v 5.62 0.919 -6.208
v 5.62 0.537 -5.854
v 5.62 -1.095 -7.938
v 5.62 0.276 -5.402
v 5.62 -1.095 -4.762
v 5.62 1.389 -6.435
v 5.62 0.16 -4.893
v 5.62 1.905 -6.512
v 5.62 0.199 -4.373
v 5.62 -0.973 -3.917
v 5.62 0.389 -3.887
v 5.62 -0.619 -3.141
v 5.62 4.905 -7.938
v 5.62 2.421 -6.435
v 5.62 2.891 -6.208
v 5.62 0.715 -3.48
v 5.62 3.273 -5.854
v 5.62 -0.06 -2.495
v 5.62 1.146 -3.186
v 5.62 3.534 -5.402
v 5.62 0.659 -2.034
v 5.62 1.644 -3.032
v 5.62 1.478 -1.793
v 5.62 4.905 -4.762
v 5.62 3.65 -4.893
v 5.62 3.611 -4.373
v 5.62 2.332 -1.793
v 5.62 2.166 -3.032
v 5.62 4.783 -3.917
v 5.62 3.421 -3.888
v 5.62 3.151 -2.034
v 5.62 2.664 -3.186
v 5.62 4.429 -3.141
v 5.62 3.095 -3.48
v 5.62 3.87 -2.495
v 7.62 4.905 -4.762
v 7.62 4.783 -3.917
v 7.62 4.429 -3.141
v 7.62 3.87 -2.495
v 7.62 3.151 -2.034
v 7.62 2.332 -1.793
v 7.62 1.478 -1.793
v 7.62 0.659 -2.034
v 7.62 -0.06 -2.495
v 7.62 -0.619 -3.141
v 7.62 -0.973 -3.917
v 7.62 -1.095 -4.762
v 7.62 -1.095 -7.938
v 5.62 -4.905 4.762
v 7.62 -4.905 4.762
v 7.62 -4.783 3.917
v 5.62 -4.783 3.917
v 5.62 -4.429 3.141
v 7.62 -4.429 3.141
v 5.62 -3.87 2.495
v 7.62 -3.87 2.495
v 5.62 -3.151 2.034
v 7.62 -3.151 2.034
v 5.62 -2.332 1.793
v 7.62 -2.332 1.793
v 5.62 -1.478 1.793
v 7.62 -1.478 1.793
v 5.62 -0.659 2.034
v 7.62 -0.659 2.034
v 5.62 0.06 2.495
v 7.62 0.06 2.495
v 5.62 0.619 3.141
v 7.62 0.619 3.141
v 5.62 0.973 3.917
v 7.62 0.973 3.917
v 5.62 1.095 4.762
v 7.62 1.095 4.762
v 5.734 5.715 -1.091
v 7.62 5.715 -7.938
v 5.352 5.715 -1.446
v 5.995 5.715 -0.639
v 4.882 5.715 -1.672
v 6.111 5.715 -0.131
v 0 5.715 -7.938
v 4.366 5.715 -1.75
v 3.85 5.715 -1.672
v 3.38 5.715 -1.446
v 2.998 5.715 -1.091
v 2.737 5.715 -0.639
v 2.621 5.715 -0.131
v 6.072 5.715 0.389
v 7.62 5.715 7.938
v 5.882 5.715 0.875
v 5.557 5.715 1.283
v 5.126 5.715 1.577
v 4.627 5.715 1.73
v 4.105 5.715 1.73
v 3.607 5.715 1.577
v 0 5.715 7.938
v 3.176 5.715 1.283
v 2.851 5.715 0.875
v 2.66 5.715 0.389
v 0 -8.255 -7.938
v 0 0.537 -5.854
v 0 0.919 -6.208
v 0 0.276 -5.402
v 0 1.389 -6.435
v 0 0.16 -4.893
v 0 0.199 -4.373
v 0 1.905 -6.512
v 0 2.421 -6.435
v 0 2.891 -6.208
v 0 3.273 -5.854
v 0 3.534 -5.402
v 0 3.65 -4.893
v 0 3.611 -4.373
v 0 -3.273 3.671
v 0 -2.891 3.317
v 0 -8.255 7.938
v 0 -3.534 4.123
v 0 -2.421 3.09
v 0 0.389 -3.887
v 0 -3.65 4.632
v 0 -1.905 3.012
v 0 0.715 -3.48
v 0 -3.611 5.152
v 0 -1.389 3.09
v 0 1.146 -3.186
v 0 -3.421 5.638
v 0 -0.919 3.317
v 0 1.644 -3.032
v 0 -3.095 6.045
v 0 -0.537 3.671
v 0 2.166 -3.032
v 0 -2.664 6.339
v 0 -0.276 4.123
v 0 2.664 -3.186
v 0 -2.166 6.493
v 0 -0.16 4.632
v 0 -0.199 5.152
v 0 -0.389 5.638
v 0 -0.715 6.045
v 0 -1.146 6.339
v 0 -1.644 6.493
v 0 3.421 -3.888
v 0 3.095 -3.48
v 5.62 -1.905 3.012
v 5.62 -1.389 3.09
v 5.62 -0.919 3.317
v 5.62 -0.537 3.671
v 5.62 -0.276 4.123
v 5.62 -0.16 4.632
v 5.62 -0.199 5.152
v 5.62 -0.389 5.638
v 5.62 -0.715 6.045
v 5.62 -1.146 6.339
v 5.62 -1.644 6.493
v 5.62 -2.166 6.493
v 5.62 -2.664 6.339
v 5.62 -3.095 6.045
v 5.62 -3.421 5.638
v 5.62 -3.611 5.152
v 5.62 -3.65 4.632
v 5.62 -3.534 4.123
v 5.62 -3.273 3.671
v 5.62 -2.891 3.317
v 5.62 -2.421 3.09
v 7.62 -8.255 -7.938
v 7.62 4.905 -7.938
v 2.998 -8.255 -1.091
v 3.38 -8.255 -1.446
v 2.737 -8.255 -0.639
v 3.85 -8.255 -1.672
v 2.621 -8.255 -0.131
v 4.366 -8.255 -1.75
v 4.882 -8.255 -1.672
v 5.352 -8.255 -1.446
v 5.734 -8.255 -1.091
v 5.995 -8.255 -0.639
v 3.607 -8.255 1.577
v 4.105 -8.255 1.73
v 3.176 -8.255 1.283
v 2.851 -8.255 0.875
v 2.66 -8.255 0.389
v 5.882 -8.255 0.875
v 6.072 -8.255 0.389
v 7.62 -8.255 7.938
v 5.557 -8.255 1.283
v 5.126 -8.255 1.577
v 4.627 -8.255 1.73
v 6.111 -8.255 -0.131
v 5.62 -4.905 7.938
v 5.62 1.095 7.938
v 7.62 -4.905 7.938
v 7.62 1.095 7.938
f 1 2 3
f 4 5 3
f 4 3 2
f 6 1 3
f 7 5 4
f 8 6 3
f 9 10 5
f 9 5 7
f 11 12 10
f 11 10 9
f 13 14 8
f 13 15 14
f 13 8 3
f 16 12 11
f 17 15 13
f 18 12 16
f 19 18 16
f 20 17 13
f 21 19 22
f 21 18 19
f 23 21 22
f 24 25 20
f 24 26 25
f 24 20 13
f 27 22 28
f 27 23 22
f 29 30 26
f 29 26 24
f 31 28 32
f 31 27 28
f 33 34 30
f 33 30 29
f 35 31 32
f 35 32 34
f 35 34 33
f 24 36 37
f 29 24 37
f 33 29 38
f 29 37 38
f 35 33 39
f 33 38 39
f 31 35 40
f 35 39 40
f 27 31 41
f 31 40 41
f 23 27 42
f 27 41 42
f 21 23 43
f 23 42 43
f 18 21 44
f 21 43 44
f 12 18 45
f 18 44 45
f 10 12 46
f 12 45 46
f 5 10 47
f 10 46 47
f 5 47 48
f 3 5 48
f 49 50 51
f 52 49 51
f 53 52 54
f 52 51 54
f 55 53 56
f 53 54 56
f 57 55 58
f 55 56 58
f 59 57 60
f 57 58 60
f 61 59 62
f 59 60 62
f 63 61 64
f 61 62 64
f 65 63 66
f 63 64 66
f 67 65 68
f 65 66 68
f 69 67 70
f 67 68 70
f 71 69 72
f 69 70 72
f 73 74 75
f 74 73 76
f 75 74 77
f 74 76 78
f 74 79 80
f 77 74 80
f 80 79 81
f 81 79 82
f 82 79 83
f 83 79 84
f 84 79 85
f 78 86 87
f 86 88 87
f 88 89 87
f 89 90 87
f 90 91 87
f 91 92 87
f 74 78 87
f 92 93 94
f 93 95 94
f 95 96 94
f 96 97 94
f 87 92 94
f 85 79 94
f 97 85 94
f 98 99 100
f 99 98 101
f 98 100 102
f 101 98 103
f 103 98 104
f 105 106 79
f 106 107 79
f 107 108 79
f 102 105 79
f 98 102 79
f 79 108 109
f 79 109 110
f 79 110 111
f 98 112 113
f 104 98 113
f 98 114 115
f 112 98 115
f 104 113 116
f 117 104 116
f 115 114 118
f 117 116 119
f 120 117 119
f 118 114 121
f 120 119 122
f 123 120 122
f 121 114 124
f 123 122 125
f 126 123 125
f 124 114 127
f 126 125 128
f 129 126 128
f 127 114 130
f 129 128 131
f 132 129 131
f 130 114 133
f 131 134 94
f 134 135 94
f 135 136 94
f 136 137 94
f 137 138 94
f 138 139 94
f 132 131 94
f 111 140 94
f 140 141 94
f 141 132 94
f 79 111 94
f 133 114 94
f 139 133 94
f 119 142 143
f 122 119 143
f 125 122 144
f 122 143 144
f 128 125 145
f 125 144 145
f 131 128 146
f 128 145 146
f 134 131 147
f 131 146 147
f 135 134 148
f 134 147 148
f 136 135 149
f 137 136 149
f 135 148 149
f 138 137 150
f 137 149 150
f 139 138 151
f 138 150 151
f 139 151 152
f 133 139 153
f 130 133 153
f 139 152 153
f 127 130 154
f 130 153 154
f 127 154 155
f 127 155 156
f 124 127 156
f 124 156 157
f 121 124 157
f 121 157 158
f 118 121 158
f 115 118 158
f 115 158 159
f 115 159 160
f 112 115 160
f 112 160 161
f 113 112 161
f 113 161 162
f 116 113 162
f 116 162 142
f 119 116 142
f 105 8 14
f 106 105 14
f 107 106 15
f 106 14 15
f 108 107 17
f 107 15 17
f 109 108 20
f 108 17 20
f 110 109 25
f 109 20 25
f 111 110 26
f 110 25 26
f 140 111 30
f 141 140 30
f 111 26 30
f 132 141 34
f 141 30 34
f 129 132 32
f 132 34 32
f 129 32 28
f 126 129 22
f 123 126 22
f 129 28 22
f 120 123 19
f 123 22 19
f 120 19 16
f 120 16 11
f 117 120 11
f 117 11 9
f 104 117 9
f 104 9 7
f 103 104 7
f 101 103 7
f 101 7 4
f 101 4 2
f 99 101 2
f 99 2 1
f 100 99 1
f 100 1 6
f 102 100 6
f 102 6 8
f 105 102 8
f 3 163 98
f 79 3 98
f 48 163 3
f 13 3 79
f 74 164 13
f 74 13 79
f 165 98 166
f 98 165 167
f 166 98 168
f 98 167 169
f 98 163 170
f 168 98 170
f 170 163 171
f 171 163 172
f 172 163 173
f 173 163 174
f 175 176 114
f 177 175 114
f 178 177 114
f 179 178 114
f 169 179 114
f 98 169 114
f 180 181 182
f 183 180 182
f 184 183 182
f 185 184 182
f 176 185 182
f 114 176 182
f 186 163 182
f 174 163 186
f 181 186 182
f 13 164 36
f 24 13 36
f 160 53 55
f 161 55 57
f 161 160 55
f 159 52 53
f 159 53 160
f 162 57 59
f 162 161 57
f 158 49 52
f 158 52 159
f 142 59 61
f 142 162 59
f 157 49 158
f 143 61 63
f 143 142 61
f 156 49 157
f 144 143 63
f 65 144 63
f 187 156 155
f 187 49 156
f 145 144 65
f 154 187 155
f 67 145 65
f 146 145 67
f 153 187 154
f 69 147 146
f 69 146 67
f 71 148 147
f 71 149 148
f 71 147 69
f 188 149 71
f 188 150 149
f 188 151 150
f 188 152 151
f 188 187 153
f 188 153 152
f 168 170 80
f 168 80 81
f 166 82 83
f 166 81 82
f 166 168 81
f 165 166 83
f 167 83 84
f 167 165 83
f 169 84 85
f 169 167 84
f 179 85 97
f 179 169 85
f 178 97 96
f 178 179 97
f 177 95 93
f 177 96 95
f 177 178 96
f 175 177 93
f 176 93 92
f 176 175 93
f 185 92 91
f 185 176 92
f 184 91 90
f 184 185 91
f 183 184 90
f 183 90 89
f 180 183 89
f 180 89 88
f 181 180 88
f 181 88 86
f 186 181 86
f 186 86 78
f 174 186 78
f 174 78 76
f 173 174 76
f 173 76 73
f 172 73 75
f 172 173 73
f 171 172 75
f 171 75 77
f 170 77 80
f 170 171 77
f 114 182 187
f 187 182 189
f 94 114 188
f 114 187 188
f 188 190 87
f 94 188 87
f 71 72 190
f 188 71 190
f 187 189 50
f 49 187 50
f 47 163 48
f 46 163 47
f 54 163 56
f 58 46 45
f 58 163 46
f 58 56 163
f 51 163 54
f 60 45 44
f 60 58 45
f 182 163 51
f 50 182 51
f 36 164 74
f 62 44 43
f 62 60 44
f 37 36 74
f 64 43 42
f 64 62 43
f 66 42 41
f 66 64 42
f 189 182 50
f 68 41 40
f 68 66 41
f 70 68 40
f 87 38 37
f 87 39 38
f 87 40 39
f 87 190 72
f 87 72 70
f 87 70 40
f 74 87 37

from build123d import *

# Parameters (mm, degrees)
SKETCH1_W           = 11.43
SKETCH1_H           = 15.875
BOSS_EXTRUDE1_DEPTH = 7.62
SKETCH3_R           = 1.75
CUT_EXTRUDE1_DEPTH  = 22.2885
SKETCH4_R           = 1.75
CUT_EXTRUDE2_DEPTH  = 22.2885
SKETCH5_R           = 3
SKETCH5_R_2         = 1.75
CUT_EXTRUDE3_DEPTH  = 2
SKETCH6_W           = 2.54
SKETCH6_H           = 15.875
BOSS_EXTRUDE2_DEPTH = 7.62
CUT_EXTRUDE4_START  = -18.796
SKETCH8_R           = 1.75
CUT_EXTRUDE4_DEPTH  = 18.796


with BuildPart() as part:
    # Sketch1 → Boss-Extrude1 (new body)
    with BuildSketch(Plane.YZ):
        Rectangle(SKETCH1_W, SKETCH1_H)
    extrude(amount=BOSS_EXTRUDE1_DEPTH)

    # Sketch3 → Cut-Extrude1 (cut)
    with BuildSketch(Plane.XZ.offset(5.715)):
        with Locations(Location((4.36625, 0, 0), (0, 0, 270))):
            Circle(SKETCH3_R)
    extrude(amount=-CUT_EXTRUDE1_DEPTH, mode=Mode.SUBTRACT)

    # Sketch4 → Cut-Extrude2 (cut)
    with BuildSketch(Plane.YZ.offset(7.62)):
        with Locations(Location((-1.905, 4.7625, 0), (0, 0, 270))):
            Circle(SKETCH4_R)
        with Locations(Location((1.905, -4.7625, 0), (0, 0, 270))):
            Circle(SKETCH4_R)
    extrude(amount=-CUT_EXTRUDE2_DEPTH, mode=Mode.SUBTRACT)

    # Sketch5 → Cut-Extrude3 (cut)
    # profile 1 of 4: a face of its own
    with BuildSketch(Plane.YZ.offset(7.62)):
        with Locations((-1.905, 4.7625)):
            Circle(SKETCH5_R)
        with Locations(Location((-1.905, 4.7625, 0), (0, 0, 270))):
            Circle(SKETCH5_R_2, mode=Mode.SUBTRACT)
    # profile 2 of 4: a face of its own
    with BuildSketch(Plane.YZ.offset(7.62)):
        with BuildLine():
            Line((-4.905, 7.9375), (-4.905, 4.7625))
            ThreePointArc((-4.905, 4.7625), (-1.905, 7.7625), (1.095, 4.7625))
            Line((1.095, 4.7625), (1.095, 7.9375))
            Line((1.095, 7.9375), (-4.905, 7.9375))
        make_face()
    # profile 3 of 4: a face of its own
    with BuildSketch(Plane.YZ.offset(7.62)):
        with Locations((1.905, -4.7625)):
            Circle(SKETCH5_R)
        with Locations(Location((1.905, -4.7625, 0), (0, 0, 270))):
            Circle(SKETCH5_R_2, mode=Mode.SUBTRACT)
    # profile 4 of 4: a face of its own
    with BuildSketch(Plane.YZ.offset(7.62)):
        with BuildLine():
            Line((4.905, -7.9375), (4.905, -4.7625))
            ThreePointArc((4.905, -4.7625), (1.905, -7.7625), (-1.095, -4.7625))
            Line((-1.095, -4.7625), (-1.095, -7.9375))
            Line((-1.095, -7.9375), (4.905, -7.9375))
        make_face()
    extrude(amount=-CUT_EXTRUDE3_DEPTH, mode=Mode.SUBTRACT)

    # Sketch6 → Boss-Extrude2 (add)
    with BuildSketch(Plane.YZ.offset(7.62)):
        with Locations((-6.985, 0)):
            Rectangle(SKETCH6_W, SKETCH6_H)
    extrude(amount=-BOSS_EXTRUDE2_DEPTH)

    # Sketch8 → Cut-Extrude4 (cut)
    with BuildSketch(Plane(origin=(0, 5.715, 0), x_dir=(-1, 0, 0), z_dir=(0, 1, 0)).offset(CUT_EXTRUDE4_START)):
        with Locations(Location((-4.36625, 0, 0), (0, 0, 270))):
            Circle(SKETCH8_R)
    extrude(amount=CUT_EXTRUDE4_DEPTH, mode=Mode.SUBTRACT)


solid = part.part
